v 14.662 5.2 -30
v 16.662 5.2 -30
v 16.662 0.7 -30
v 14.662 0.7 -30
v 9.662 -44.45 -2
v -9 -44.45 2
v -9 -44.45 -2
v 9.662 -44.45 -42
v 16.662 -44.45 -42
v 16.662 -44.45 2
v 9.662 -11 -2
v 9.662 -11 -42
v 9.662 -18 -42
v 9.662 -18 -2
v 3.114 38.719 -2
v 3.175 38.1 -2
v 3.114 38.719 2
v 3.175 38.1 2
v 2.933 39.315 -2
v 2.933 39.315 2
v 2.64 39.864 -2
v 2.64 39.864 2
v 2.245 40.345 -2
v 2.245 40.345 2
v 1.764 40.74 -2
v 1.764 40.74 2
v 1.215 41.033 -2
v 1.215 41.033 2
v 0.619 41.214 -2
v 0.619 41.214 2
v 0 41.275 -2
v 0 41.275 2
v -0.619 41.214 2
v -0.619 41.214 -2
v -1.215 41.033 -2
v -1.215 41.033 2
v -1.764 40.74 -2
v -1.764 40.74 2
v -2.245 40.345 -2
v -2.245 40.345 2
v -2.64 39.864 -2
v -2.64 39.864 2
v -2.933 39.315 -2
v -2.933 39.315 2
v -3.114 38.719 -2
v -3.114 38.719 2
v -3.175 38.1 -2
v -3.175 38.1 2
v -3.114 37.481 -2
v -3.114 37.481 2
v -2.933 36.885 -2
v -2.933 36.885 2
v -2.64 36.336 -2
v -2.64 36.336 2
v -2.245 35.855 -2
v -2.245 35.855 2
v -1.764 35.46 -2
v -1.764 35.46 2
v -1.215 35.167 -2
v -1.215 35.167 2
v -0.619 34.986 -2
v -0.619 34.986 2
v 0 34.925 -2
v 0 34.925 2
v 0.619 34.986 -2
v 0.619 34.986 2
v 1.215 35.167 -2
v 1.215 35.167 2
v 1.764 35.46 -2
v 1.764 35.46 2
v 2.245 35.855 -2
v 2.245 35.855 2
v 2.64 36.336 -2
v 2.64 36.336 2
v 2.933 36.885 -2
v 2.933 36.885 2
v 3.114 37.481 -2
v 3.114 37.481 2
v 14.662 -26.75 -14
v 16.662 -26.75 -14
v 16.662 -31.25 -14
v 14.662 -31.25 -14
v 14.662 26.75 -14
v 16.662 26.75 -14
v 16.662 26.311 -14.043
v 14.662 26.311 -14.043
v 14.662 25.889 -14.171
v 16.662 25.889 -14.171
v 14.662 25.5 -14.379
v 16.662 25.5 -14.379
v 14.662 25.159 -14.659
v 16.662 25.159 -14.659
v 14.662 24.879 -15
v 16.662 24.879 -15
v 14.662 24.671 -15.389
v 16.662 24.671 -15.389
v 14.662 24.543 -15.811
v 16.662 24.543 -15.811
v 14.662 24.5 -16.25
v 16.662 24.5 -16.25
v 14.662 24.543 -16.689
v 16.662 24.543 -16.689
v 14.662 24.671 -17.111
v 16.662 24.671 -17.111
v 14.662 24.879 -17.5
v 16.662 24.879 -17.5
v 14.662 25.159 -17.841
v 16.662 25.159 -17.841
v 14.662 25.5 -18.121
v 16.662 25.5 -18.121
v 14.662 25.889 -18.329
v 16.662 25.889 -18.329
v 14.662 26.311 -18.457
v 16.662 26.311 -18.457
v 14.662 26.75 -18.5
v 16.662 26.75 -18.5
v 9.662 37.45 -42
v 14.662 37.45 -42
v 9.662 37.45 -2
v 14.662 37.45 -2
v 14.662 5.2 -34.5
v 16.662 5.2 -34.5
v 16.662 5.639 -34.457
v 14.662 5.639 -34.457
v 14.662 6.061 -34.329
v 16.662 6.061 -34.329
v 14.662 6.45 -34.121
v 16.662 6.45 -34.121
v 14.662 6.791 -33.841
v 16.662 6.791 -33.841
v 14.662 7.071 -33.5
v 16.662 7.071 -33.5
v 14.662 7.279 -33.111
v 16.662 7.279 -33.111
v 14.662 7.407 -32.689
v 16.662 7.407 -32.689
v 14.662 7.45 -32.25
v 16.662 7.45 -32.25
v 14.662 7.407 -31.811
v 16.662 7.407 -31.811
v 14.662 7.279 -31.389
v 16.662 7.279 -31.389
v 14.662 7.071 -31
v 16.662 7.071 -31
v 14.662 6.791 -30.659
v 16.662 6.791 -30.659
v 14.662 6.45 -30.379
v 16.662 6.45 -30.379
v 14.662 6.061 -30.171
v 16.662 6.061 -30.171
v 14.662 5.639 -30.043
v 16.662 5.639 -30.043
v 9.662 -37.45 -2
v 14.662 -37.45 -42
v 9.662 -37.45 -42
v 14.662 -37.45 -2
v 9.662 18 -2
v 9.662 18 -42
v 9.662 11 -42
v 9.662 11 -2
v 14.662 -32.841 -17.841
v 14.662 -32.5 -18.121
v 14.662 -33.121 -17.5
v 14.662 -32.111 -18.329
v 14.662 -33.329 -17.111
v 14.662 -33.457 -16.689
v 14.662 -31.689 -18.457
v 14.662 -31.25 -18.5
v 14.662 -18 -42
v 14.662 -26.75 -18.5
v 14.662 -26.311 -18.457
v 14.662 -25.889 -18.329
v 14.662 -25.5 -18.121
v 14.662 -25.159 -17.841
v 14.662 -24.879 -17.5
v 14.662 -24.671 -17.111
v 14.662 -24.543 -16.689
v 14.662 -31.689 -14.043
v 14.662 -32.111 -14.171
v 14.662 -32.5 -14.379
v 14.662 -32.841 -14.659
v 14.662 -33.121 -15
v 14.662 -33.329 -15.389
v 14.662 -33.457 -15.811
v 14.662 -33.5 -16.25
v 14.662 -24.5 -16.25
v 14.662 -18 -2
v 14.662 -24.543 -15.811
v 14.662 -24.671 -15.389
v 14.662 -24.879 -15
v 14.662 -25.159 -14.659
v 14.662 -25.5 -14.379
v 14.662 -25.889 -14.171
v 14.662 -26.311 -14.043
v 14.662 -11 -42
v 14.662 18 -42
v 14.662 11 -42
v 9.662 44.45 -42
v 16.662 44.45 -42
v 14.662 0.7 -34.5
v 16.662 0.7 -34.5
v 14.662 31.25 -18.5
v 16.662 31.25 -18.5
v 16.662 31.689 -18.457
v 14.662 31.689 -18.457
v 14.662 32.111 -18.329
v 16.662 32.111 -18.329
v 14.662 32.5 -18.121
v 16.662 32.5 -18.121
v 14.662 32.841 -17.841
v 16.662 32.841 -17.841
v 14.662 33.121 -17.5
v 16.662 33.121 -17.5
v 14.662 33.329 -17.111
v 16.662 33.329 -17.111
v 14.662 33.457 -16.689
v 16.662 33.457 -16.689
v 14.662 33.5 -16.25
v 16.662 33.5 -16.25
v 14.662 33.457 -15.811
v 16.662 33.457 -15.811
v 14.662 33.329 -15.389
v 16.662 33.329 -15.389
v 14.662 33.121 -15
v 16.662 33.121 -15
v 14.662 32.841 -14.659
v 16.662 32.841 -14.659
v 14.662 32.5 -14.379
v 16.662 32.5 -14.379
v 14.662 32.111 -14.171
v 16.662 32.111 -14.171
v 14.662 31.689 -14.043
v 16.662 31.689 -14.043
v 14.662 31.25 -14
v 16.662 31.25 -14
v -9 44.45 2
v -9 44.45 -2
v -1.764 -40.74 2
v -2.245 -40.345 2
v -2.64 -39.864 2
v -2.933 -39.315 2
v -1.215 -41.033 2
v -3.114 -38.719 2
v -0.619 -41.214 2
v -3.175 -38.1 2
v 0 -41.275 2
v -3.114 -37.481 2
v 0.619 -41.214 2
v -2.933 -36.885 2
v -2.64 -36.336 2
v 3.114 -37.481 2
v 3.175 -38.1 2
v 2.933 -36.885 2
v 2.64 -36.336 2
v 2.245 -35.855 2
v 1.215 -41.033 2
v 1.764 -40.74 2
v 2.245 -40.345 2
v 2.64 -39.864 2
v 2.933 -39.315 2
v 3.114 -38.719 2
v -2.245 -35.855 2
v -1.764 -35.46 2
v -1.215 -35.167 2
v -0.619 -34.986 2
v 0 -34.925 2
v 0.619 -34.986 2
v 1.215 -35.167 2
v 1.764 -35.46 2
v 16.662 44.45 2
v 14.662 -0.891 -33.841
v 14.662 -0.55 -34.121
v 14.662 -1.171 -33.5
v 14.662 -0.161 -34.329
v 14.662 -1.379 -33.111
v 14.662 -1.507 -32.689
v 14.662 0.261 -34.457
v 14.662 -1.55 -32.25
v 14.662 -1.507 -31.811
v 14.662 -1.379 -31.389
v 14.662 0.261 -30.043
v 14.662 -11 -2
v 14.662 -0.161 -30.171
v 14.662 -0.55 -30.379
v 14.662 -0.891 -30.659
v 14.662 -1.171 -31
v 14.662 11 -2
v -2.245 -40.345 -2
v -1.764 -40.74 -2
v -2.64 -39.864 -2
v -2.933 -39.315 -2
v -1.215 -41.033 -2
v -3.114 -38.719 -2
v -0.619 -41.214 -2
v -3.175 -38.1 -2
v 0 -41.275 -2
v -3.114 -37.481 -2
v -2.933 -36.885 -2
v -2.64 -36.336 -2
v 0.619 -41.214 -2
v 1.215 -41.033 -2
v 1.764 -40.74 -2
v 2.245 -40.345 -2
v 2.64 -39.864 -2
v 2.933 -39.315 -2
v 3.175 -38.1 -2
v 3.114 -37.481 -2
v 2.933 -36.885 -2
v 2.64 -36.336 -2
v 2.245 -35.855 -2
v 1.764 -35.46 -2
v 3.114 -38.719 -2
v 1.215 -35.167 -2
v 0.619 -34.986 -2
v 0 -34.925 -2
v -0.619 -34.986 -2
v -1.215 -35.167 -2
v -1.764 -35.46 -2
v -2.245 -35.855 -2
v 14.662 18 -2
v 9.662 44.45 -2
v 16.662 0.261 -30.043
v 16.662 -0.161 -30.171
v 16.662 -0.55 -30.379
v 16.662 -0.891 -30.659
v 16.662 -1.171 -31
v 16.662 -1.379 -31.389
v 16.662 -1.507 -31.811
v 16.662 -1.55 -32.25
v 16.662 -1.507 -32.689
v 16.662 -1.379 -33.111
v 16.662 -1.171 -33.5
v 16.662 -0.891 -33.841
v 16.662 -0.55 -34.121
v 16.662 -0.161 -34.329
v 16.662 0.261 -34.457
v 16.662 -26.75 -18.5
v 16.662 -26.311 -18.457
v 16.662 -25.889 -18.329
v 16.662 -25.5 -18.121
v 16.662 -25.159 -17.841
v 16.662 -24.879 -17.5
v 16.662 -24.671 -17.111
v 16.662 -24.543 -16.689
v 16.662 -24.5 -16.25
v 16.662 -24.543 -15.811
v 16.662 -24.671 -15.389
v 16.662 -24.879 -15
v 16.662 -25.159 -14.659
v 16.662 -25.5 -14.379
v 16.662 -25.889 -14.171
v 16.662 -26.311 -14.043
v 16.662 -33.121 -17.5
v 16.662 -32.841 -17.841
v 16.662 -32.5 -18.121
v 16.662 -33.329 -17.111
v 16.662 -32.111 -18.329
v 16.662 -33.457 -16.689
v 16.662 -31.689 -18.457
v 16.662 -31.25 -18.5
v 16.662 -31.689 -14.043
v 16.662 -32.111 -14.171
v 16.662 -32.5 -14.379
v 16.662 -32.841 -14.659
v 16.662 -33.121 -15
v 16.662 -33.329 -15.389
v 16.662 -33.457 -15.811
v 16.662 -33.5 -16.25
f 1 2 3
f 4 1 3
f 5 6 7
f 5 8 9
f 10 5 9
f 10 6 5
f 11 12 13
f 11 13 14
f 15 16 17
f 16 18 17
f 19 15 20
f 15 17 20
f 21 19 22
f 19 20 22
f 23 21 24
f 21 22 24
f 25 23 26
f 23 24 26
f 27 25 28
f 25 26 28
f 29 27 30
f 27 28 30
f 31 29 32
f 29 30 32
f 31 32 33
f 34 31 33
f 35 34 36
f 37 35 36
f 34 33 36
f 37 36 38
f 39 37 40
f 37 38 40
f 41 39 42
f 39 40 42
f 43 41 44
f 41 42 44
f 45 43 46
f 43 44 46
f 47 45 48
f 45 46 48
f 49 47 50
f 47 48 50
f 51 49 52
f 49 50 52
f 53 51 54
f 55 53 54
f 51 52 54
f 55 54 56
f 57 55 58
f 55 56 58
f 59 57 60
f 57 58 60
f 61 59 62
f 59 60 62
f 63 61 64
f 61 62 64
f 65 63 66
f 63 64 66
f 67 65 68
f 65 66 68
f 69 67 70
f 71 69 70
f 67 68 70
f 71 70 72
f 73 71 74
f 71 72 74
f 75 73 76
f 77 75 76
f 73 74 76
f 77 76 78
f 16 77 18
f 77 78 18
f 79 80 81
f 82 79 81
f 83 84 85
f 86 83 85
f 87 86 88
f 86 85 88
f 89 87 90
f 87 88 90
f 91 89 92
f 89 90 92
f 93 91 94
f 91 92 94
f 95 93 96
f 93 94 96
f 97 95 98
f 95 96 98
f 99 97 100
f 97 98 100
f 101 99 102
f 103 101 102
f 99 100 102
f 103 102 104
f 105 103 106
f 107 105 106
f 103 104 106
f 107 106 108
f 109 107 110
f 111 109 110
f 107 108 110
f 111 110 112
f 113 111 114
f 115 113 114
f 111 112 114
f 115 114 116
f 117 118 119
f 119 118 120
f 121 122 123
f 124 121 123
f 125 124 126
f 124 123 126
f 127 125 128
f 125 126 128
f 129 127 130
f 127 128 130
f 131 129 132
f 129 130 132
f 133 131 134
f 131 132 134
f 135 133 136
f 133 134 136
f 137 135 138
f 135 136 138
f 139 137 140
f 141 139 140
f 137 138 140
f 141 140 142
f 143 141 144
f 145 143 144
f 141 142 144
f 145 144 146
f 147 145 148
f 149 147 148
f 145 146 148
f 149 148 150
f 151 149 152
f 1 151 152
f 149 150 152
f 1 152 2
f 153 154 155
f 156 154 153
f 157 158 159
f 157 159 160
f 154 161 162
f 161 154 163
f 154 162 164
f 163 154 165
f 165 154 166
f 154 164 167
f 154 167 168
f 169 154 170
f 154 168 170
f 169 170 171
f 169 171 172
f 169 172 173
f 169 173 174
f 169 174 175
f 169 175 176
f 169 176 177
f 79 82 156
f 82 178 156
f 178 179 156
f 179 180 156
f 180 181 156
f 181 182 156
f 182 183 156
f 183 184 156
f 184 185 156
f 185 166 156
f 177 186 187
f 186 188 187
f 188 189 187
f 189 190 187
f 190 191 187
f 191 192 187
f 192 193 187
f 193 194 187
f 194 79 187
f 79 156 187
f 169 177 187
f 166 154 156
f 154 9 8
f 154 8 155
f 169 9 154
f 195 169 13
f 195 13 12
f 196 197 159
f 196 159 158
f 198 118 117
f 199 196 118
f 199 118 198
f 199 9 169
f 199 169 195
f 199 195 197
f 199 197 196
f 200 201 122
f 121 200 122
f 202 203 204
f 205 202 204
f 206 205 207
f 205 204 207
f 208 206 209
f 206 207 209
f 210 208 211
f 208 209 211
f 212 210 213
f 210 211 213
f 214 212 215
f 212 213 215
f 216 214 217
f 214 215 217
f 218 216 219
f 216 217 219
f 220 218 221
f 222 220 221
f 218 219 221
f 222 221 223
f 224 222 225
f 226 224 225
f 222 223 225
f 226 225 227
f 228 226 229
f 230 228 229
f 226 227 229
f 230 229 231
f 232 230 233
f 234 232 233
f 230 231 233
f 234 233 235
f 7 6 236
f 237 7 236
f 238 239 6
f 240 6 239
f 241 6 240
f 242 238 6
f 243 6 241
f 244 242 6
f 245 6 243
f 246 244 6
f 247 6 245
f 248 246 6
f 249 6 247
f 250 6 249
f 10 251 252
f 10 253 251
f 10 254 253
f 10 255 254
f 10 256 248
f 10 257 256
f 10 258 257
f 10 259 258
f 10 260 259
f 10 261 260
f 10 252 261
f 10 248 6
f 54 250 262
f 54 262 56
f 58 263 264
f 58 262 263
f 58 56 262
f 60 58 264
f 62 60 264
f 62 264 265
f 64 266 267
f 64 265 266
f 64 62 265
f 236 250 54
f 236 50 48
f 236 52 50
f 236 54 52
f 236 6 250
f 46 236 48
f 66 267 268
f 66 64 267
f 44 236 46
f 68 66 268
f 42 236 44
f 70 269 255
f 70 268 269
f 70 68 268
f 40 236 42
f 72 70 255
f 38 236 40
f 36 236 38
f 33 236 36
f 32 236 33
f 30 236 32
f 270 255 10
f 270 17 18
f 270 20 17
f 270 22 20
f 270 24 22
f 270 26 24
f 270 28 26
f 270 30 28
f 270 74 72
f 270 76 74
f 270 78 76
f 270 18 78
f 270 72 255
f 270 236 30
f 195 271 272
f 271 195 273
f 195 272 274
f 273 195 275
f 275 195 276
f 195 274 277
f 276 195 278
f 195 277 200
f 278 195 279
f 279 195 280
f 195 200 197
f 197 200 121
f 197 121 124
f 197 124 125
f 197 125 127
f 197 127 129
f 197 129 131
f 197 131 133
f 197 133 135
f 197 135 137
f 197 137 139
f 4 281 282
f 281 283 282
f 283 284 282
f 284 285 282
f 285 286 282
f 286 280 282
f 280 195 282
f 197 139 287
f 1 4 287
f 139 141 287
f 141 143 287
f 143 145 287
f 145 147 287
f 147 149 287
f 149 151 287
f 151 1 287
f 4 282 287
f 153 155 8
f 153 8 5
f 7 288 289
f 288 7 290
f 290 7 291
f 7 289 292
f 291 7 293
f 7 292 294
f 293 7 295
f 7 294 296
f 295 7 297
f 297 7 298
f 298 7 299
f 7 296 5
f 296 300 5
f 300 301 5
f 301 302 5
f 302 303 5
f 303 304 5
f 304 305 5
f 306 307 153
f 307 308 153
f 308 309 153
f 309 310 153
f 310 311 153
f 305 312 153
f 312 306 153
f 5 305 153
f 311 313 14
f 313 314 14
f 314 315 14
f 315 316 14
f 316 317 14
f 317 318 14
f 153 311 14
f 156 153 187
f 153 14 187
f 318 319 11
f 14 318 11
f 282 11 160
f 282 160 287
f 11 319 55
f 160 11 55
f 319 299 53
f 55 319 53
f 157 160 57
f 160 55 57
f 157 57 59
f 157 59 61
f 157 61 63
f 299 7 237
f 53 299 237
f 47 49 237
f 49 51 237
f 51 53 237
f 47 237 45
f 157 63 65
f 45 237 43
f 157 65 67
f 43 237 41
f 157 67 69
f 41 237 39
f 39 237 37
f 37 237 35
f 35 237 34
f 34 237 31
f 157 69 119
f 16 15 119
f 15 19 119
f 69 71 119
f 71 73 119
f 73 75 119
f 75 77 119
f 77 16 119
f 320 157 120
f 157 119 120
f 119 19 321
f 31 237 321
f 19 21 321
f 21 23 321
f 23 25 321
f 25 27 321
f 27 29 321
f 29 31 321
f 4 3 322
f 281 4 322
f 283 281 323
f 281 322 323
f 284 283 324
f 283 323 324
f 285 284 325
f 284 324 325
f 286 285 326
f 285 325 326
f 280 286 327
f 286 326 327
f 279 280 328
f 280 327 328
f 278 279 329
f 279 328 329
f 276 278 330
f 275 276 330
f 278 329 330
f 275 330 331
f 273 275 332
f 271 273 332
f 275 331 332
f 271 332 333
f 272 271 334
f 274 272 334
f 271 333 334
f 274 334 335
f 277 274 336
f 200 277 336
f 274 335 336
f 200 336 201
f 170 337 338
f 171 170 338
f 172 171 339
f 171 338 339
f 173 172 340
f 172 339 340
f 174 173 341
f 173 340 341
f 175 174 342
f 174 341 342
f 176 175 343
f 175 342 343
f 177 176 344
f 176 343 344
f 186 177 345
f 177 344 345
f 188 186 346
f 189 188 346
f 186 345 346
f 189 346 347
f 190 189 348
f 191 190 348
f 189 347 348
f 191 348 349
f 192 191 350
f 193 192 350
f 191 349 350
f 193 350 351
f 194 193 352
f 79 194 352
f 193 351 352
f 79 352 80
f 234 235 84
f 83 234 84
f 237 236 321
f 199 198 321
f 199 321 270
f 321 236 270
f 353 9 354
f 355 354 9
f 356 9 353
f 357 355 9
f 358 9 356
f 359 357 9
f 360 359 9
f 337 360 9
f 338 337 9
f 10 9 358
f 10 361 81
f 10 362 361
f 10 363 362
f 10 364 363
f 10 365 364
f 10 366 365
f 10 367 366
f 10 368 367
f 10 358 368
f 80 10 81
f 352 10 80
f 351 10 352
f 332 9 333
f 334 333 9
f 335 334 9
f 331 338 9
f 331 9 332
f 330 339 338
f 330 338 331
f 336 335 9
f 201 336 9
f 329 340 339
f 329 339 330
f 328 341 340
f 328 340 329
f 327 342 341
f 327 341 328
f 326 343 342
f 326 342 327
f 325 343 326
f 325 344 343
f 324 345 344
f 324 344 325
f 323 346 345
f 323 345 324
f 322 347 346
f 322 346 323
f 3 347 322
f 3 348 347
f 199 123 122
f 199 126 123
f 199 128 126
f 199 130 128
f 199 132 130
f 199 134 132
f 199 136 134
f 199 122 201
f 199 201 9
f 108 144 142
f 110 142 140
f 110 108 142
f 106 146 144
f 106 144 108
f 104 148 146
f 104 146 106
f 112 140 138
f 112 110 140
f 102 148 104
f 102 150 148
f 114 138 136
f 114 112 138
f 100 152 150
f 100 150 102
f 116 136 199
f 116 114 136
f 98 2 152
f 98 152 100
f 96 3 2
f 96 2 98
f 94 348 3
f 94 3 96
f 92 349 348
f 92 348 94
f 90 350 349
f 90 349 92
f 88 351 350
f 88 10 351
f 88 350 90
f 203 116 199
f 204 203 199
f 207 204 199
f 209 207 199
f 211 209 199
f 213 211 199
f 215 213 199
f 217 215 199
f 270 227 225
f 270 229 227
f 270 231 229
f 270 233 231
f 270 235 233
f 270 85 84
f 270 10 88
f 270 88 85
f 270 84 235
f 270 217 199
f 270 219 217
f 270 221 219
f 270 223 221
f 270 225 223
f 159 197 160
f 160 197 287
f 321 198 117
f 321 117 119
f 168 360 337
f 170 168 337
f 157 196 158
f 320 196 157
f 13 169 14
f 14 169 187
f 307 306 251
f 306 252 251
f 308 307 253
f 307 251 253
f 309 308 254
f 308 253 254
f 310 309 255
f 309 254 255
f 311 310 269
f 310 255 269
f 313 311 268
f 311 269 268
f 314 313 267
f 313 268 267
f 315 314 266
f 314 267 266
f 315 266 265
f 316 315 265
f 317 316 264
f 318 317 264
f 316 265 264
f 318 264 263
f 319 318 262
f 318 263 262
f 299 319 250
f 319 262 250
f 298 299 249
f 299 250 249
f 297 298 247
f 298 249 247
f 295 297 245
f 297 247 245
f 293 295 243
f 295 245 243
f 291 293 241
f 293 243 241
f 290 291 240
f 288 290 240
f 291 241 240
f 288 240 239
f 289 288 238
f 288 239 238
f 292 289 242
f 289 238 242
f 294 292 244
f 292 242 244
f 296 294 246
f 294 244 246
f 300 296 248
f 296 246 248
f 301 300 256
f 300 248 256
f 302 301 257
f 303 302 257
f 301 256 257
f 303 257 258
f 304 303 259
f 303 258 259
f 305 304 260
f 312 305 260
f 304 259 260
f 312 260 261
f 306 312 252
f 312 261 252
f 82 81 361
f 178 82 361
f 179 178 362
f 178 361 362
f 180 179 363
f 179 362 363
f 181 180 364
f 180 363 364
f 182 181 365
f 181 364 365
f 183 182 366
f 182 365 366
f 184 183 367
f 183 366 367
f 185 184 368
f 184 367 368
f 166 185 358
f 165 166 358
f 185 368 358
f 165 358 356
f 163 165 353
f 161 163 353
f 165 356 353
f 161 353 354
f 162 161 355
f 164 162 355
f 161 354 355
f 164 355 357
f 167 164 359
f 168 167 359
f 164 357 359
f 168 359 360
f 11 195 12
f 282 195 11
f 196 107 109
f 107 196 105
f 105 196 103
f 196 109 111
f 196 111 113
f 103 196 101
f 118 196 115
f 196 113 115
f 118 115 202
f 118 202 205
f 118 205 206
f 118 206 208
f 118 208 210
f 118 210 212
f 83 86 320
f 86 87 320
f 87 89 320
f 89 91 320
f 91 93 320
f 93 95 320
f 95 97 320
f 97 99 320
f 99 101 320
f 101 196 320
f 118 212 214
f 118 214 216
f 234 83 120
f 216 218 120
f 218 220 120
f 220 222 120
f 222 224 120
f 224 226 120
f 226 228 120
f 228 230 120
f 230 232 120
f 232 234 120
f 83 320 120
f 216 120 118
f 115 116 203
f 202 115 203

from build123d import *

# Parameters (mm, degrees)
SKETCH1_W           = 25.6624
SKETCH1_H           = 88.9
SKETCH1_R           = 3.175
BOSS_EXTRUDE1_DEPTH = 2
SKETCH2_W           = 2
SKETCH2_H           = 88.9
BOSS_EXTRUDE2_DEPTH = 40
CUT_EXTRUDE1_DEPTH  = 20
SKETCH8_W           = 40
SKETCH8_H           = 7
BOSS_EXTRUDE6_DEPTH = 5
BOSS_EXTRUDE8_START = 2
SKETCH9_W           = 25.6624
SKETCH9_H           = 88.9
SKETCH9_R           = 3.175
BOSS_EXTRUDE8_DEPTH = 2
BOSS_EXTRUDE5_START = 1
SKETCH7_W           = 25.6624
SKETCH7_H           = 88.9
SKETCH7_R           = 3.175
BOSS_EXTRUDE5_DEPTH = 1


with BuildPart() as part:
    # Sketch1 → Boss-Extrude1 (new body)
    with BuildSketch(Plane.XY):
        with Locations((3.8312, 0)):
            Rectangle(SKETCH1_W, SKETCH1_H)
        with Locations((0, -38.1)):
            Circle(SKETCH1_R, mode=Mode.SUBTRACT)
        with Locations((0, 38.1)):
            Circle(SKETCH1_R, mode=Mode.SUBTRACT)
    extrude(amount=-BOSS_EXTRUDE1_DEPTH)

    # Sketch2 → Boss-Extrude2 (add)
    with BuildSketch(Plane(origin=(0, 0, -2), x_dir=(-1, 0, 0), z_dir=(0, 0, -1))):
        with Locations((-15.6624, 0)):
            Rectangle(SKETCH2_W, SKETCH2_H)
    extrude(amount=BOSS_EXTRUDE2_DEPTH)

    # Sketch3 → Cut-Extrude1 (cut)
    with BuildSketch(Plane(origin=(16.6624, 0, 0), x_dir=(0, 0, -1), z_dir=(1, 0, 0))):
        with BuildLine():
            Line((14, -26.75), (14, -31.25))
            ThreePointArc((14, -31.25), (16.25, -33.5), (18.5, -31.25))
            Line((18.5, -31.25), (18.5, -26.75))
            ThreePointArc((18.5, -26.75), (16.25, -24.5), (14, -26.75))
        make_face()
        with BuildLine():
            Line((18.5, 26.75), (18.5, 31.25))
            ThreePointArc((18.5, 31.25), (16.25, 33.5), (14, 31.25))
            Line((14, 31.25), (14, 26.75))
            ThreePointArc((14, 26.75), (16.25, 24.5), (18.5, 26.75))
        make_face()
        with BuildLine():
            Line((30, 5.2), (30, 0.7))
            ThreePointArc((30, 0.7), (32.25, -1.55), (34.5, 0.7))
            Line((34.5, 0.7), (34.5, 5.2))
            ThreePointArc((34.5, 5.2), (32.25, 7.45), (30, 5.2))
        make_face()
    extrude(amount=-CUT_EXTRUDE1_DEPTH, mode=Mode.SUBTRACT)

    # Sketch8 → Boss-Extrude6 (add)
    with BuildSketch(Plane.ZY.offset(-14.6624)):
        with Locations((-22, -14.5)):
            Rectangle(SKETCH8_W, SKETCH8_H)
        with Locations((-22, 14.5)):
            Rectangle(SKETCH8_W, SKETCH8_H)
        with Locations((-22, 40.95)):
            Rectangle(SKETCH8_W, SKETCH8_H)
        with Locations((-22, -40.95)):
            Rectangle(SKETCH8_W, SKETCH8_H)
    extrude(amount=BOSS_EXTRUDE6_DEPTH)

    # Sketch9 → Boss-Extrude8 (add)
    with BuildSketch(Plane.XY.offset(BOSS_EXTRUDE8_START)):
        with Locations((3.8312, 0)):
            Rectangle(SKETCH9_W, SKETCH9_H)
        with Locations((0, -38.1)):
            Circle(SKETCH9_R, mode=Mode.SUBTRACT)
        with Locations((0, 38.1)):
            Circle(SKETCH9_R, mode=Mode.SUBTRACT)
    extrude(amount=-BOSS_EXTRUDE8_DEPTH)

    # Sketch7 → Boss-Extrude5 (add)
    with BuildSketch(Plane.XY.offset(BOSS_EXTRUDE5_START)):
        with Locations((3.8312, 0)):
            Rectangle(SKETCH7_W, SKETCH7_H)
        with Locations((0, -38.1)):
            Circle(SKETCH7_R, mode=Mode.SUBTRACT)
        with Locations((0, 38.1)):
            Circle(SKETCH7_R, mode=Mode.SUBTRACT)
    extrude(amount=-BOSS_EXTRUDE5_DEPTH)


solid = part.part
